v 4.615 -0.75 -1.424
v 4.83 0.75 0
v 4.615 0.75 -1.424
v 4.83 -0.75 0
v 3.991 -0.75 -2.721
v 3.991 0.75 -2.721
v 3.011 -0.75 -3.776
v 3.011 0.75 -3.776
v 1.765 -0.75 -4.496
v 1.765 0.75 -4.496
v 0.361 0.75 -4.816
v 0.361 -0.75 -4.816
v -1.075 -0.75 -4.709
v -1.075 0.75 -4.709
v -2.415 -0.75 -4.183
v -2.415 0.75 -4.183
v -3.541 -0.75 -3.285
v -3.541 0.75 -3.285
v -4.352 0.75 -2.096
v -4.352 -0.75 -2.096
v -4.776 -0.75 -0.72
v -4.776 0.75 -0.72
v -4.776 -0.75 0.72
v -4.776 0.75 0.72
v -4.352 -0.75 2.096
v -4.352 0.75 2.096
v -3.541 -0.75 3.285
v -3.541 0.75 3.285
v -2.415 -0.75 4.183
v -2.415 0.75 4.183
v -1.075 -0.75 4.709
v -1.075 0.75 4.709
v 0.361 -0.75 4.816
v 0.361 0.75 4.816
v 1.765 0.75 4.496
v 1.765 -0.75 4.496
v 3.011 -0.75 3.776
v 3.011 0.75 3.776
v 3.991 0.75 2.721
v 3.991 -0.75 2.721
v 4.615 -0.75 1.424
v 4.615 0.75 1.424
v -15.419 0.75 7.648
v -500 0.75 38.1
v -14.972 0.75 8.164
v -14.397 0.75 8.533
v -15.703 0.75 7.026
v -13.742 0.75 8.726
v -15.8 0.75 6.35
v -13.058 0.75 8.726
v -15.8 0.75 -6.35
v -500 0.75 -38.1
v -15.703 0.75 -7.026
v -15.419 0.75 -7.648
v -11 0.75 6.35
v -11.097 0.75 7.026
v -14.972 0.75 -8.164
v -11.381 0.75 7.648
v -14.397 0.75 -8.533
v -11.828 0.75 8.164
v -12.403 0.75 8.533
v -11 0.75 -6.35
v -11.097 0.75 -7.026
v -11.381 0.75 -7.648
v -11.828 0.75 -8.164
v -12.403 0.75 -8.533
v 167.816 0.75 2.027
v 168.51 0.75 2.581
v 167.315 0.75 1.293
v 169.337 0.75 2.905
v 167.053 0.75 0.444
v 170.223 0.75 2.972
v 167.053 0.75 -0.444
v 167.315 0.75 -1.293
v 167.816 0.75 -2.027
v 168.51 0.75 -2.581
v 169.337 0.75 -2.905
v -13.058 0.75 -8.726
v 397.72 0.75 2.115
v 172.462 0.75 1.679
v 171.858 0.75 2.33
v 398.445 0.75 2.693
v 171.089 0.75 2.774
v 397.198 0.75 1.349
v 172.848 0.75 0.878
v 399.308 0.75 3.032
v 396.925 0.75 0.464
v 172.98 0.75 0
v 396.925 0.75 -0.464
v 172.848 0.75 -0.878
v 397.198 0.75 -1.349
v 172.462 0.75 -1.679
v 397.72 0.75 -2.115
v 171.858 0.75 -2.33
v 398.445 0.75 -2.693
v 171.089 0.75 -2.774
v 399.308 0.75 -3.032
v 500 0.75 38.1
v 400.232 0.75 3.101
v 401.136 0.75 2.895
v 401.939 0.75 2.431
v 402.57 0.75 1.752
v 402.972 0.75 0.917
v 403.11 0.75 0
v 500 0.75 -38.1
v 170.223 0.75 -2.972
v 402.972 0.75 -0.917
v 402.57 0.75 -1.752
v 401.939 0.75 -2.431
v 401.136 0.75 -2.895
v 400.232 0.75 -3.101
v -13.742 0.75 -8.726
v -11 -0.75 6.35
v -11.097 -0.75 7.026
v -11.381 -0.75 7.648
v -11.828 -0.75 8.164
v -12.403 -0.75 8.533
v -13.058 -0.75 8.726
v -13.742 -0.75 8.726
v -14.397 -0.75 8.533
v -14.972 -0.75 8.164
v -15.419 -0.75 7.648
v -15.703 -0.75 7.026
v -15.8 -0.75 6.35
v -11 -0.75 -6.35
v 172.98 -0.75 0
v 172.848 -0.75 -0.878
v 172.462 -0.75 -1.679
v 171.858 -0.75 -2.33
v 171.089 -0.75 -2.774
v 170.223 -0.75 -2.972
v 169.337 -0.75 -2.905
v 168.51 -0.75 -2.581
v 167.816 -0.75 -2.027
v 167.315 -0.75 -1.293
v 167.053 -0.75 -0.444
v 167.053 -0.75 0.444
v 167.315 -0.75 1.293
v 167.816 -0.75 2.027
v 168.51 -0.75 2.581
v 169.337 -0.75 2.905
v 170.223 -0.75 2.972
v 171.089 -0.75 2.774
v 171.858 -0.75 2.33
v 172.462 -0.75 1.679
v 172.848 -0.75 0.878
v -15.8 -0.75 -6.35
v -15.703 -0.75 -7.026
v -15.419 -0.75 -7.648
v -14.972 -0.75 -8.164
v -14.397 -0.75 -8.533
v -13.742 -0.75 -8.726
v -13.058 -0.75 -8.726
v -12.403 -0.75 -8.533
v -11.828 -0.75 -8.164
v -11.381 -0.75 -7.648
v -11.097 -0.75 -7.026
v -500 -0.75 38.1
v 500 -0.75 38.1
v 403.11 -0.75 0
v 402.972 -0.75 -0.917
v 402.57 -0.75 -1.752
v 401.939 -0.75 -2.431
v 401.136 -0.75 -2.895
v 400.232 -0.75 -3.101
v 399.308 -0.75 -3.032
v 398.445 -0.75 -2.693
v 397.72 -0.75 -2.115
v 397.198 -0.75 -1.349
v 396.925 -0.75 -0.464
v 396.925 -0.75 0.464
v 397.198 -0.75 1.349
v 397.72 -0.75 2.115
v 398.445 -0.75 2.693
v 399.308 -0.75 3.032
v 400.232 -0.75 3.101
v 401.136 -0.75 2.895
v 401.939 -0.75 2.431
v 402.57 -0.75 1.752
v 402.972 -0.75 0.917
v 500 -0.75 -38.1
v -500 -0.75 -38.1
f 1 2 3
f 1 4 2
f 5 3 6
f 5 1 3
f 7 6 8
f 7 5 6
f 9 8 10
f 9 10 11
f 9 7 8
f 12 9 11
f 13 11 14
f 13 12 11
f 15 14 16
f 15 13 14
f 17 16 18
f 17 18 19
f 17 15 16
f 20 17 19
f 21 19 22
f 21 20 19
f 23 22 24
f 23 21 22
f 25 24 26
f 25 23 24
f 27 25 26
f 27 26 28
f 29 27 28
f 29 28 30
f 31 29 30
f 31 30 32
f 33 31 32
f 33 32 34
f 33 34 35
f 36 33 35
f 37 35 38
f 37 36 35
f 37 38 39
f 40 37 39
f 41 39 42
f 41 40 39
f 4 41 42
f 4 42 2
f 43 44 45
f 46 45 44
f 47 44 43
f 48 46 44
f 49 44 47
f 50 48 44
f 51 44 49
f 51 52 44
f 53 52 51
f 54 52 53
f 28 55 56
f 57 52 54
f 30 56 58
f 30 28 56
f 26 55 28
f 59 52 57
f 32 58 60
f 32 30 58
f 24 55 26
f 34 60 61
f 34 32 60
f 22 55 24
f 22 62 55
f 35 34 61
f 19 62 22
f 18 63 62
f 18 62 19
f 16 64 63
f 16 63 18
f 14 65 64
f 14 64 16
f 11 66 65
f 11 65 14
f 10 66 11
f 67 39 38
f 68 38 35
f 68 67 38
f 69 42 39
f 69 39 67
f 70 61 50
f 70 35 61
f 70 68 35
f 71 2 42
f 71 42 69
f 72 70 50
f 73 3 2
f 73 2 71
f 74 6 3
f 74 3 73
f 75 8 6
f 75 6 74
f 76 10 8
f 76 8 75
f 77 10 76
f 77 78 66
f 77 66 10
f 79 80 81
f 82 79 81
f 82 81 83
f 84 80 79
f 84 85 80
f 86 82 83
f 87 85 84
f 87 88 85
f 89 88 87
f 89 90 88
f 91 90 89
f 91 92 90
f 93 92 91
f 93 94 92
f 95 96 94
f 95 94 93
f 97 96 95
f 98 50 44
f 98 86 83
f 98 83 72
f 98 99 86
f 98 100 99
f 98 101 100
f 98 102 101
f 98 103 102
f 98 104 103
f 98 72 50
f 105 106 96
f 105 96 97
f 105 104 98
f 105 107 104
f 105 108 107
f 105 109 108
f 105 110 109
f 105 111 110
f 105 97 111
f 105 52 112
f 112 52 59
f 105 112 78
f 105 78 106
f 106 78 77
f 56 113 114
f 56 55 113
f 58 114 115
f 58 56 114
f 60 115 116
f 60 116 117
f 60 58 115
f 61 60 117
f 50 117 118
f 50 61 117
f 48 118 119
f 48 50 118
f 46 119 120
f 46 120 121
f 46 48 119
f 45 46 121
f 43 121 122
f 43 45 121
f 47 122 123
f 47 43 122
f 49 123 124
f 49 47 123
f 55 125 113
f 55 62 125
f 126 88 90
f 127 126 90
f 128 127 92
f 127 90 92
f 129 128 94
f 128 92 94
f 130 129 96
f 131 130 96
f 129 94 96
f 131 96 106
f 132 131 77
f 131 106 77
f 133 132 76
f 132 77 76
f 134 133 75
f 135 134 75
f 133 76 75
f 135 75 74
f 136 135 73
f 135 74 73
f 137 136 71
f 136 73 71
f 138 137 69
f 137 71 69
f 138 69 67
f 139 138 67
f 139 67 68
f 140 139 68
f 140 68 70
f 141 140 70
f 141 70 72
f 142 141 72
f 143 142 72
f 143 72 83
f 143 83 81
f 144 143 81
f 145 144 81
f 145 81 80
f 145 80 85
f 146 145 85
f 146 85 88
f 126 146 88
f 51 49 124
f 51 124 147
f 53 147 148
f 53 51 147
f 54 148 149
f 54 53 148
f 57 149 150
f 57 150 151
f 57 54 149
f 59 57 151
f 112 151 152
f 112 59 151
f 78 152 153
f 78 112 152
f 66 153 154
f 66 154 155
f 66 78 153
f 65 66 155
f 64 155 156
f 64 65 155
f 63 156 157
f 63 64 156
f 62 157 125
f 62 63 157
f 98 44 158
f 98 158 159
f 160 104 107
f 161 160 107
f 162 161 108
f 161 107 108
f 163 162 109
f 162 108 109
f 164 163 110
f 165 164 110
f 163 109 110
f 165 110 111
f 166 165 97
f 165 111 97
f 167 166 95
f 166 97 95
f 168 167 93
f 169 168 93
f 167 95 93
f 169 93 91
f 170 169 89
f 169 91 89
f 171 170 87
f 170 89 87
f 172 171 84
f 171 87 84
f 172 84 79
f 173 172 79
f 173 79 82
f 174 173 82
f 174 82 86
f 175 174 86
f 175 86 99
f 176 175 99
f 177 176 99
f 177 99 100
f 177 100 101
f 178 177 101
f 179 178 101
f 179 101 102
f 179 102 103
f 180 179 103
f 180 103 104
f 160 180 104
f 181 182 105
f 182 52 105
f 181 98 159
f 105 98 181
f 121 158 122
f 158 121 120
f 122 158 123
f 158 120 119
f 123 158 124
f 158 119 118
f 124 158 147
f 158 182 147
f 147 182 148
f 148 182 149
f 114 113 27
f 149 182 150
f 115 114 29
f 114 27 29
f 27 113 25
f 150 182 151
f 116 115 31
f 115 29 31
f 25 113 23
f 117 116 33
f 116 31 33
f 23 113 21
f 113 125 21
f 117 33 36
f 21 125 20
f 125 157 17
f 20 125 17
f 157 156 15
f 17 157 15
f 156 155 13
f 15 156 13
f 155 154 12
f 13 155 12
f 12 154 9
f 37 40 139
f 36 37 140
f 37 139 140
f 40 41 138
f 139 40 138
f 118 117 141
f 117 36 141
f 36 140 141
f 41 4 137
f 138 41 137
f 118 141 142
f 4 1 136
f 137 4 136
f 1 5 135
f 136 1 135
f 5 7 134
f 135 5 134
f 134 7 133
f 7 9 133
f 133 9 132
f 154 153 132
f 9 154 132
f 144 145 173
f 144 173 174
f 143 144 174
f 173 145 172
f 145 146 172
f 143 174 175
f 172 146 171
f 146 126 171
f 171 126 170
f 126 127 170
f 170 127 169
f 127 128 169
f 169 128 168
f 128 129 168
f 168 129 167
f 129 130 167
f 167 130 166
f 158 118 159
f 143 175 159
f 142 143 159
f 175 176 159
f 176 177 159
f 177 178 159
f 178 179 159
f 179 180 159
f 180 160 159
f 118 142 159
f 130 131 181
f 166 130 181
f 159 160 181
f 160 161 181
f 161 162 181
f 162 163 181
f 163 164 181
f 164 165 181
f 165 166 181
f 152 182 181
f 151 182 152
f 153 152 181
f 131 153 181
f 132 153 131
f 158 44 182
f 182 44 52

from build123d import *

# Parameters (mm, degrees)
SKETCH1_W           = 1000
SKETCH1_H           = 76.2
SKETCH1_R           = 4.83
BOSS_EXTRUDE1_DEPTH = 0.75
SKETCH2_R           = 2.98
SKETCH2_R_2         = 3.11
CUT_EXTRUDE1_DEPTH  = 2.5


with BuildPart() as part:
    # Sketch1 → Boss-Extrude1 (new body, symmetric)
    with BuildSketch(Plane(origin=(0, 0, 0), x_dir=(1, 0, 0), z_dir=(0, 1, 0))):
        Rectangle(SKETCH1_W, SKETCH1_H)
        Circle(SKETCH1_R, mode=Mode.SUBTRACT)
        with BuildLine():
            Line((-15.8, -6.35), (-15.8, 6.35))
            ThreePointArc((-15.8, 6.35), (-13.4, 8.75), (-11, 6.35))
            Line((-11, 6.35), (-11, -6.35))
            ThreePointArc((-11, -6.35), (-13.4, -8.75), (-15.8, -6.35))
        make_face(mode=Mode.SUBTRACT)
    extrude(amount=BOSS_EXTRUDE1_DEPTH, both=True)

    # Sketch2 → Cut-Extrude1 (cut, through all)
    with BuildSketch(Plane(origin=(0, 0.75, 0), x_dir=(1, 0, 0), z_dir=(0, 1, 0))):
        with Locations((170, 0)):
            Circle(SKETCH2_R)
        with Locations((400, 0)):
            Circle(SKETCH2_R_2)
    extrude(amount=-CUT_EXTRUDE1_DEPTH, mode=Mode.SUBTRACT)


solid = part.part
